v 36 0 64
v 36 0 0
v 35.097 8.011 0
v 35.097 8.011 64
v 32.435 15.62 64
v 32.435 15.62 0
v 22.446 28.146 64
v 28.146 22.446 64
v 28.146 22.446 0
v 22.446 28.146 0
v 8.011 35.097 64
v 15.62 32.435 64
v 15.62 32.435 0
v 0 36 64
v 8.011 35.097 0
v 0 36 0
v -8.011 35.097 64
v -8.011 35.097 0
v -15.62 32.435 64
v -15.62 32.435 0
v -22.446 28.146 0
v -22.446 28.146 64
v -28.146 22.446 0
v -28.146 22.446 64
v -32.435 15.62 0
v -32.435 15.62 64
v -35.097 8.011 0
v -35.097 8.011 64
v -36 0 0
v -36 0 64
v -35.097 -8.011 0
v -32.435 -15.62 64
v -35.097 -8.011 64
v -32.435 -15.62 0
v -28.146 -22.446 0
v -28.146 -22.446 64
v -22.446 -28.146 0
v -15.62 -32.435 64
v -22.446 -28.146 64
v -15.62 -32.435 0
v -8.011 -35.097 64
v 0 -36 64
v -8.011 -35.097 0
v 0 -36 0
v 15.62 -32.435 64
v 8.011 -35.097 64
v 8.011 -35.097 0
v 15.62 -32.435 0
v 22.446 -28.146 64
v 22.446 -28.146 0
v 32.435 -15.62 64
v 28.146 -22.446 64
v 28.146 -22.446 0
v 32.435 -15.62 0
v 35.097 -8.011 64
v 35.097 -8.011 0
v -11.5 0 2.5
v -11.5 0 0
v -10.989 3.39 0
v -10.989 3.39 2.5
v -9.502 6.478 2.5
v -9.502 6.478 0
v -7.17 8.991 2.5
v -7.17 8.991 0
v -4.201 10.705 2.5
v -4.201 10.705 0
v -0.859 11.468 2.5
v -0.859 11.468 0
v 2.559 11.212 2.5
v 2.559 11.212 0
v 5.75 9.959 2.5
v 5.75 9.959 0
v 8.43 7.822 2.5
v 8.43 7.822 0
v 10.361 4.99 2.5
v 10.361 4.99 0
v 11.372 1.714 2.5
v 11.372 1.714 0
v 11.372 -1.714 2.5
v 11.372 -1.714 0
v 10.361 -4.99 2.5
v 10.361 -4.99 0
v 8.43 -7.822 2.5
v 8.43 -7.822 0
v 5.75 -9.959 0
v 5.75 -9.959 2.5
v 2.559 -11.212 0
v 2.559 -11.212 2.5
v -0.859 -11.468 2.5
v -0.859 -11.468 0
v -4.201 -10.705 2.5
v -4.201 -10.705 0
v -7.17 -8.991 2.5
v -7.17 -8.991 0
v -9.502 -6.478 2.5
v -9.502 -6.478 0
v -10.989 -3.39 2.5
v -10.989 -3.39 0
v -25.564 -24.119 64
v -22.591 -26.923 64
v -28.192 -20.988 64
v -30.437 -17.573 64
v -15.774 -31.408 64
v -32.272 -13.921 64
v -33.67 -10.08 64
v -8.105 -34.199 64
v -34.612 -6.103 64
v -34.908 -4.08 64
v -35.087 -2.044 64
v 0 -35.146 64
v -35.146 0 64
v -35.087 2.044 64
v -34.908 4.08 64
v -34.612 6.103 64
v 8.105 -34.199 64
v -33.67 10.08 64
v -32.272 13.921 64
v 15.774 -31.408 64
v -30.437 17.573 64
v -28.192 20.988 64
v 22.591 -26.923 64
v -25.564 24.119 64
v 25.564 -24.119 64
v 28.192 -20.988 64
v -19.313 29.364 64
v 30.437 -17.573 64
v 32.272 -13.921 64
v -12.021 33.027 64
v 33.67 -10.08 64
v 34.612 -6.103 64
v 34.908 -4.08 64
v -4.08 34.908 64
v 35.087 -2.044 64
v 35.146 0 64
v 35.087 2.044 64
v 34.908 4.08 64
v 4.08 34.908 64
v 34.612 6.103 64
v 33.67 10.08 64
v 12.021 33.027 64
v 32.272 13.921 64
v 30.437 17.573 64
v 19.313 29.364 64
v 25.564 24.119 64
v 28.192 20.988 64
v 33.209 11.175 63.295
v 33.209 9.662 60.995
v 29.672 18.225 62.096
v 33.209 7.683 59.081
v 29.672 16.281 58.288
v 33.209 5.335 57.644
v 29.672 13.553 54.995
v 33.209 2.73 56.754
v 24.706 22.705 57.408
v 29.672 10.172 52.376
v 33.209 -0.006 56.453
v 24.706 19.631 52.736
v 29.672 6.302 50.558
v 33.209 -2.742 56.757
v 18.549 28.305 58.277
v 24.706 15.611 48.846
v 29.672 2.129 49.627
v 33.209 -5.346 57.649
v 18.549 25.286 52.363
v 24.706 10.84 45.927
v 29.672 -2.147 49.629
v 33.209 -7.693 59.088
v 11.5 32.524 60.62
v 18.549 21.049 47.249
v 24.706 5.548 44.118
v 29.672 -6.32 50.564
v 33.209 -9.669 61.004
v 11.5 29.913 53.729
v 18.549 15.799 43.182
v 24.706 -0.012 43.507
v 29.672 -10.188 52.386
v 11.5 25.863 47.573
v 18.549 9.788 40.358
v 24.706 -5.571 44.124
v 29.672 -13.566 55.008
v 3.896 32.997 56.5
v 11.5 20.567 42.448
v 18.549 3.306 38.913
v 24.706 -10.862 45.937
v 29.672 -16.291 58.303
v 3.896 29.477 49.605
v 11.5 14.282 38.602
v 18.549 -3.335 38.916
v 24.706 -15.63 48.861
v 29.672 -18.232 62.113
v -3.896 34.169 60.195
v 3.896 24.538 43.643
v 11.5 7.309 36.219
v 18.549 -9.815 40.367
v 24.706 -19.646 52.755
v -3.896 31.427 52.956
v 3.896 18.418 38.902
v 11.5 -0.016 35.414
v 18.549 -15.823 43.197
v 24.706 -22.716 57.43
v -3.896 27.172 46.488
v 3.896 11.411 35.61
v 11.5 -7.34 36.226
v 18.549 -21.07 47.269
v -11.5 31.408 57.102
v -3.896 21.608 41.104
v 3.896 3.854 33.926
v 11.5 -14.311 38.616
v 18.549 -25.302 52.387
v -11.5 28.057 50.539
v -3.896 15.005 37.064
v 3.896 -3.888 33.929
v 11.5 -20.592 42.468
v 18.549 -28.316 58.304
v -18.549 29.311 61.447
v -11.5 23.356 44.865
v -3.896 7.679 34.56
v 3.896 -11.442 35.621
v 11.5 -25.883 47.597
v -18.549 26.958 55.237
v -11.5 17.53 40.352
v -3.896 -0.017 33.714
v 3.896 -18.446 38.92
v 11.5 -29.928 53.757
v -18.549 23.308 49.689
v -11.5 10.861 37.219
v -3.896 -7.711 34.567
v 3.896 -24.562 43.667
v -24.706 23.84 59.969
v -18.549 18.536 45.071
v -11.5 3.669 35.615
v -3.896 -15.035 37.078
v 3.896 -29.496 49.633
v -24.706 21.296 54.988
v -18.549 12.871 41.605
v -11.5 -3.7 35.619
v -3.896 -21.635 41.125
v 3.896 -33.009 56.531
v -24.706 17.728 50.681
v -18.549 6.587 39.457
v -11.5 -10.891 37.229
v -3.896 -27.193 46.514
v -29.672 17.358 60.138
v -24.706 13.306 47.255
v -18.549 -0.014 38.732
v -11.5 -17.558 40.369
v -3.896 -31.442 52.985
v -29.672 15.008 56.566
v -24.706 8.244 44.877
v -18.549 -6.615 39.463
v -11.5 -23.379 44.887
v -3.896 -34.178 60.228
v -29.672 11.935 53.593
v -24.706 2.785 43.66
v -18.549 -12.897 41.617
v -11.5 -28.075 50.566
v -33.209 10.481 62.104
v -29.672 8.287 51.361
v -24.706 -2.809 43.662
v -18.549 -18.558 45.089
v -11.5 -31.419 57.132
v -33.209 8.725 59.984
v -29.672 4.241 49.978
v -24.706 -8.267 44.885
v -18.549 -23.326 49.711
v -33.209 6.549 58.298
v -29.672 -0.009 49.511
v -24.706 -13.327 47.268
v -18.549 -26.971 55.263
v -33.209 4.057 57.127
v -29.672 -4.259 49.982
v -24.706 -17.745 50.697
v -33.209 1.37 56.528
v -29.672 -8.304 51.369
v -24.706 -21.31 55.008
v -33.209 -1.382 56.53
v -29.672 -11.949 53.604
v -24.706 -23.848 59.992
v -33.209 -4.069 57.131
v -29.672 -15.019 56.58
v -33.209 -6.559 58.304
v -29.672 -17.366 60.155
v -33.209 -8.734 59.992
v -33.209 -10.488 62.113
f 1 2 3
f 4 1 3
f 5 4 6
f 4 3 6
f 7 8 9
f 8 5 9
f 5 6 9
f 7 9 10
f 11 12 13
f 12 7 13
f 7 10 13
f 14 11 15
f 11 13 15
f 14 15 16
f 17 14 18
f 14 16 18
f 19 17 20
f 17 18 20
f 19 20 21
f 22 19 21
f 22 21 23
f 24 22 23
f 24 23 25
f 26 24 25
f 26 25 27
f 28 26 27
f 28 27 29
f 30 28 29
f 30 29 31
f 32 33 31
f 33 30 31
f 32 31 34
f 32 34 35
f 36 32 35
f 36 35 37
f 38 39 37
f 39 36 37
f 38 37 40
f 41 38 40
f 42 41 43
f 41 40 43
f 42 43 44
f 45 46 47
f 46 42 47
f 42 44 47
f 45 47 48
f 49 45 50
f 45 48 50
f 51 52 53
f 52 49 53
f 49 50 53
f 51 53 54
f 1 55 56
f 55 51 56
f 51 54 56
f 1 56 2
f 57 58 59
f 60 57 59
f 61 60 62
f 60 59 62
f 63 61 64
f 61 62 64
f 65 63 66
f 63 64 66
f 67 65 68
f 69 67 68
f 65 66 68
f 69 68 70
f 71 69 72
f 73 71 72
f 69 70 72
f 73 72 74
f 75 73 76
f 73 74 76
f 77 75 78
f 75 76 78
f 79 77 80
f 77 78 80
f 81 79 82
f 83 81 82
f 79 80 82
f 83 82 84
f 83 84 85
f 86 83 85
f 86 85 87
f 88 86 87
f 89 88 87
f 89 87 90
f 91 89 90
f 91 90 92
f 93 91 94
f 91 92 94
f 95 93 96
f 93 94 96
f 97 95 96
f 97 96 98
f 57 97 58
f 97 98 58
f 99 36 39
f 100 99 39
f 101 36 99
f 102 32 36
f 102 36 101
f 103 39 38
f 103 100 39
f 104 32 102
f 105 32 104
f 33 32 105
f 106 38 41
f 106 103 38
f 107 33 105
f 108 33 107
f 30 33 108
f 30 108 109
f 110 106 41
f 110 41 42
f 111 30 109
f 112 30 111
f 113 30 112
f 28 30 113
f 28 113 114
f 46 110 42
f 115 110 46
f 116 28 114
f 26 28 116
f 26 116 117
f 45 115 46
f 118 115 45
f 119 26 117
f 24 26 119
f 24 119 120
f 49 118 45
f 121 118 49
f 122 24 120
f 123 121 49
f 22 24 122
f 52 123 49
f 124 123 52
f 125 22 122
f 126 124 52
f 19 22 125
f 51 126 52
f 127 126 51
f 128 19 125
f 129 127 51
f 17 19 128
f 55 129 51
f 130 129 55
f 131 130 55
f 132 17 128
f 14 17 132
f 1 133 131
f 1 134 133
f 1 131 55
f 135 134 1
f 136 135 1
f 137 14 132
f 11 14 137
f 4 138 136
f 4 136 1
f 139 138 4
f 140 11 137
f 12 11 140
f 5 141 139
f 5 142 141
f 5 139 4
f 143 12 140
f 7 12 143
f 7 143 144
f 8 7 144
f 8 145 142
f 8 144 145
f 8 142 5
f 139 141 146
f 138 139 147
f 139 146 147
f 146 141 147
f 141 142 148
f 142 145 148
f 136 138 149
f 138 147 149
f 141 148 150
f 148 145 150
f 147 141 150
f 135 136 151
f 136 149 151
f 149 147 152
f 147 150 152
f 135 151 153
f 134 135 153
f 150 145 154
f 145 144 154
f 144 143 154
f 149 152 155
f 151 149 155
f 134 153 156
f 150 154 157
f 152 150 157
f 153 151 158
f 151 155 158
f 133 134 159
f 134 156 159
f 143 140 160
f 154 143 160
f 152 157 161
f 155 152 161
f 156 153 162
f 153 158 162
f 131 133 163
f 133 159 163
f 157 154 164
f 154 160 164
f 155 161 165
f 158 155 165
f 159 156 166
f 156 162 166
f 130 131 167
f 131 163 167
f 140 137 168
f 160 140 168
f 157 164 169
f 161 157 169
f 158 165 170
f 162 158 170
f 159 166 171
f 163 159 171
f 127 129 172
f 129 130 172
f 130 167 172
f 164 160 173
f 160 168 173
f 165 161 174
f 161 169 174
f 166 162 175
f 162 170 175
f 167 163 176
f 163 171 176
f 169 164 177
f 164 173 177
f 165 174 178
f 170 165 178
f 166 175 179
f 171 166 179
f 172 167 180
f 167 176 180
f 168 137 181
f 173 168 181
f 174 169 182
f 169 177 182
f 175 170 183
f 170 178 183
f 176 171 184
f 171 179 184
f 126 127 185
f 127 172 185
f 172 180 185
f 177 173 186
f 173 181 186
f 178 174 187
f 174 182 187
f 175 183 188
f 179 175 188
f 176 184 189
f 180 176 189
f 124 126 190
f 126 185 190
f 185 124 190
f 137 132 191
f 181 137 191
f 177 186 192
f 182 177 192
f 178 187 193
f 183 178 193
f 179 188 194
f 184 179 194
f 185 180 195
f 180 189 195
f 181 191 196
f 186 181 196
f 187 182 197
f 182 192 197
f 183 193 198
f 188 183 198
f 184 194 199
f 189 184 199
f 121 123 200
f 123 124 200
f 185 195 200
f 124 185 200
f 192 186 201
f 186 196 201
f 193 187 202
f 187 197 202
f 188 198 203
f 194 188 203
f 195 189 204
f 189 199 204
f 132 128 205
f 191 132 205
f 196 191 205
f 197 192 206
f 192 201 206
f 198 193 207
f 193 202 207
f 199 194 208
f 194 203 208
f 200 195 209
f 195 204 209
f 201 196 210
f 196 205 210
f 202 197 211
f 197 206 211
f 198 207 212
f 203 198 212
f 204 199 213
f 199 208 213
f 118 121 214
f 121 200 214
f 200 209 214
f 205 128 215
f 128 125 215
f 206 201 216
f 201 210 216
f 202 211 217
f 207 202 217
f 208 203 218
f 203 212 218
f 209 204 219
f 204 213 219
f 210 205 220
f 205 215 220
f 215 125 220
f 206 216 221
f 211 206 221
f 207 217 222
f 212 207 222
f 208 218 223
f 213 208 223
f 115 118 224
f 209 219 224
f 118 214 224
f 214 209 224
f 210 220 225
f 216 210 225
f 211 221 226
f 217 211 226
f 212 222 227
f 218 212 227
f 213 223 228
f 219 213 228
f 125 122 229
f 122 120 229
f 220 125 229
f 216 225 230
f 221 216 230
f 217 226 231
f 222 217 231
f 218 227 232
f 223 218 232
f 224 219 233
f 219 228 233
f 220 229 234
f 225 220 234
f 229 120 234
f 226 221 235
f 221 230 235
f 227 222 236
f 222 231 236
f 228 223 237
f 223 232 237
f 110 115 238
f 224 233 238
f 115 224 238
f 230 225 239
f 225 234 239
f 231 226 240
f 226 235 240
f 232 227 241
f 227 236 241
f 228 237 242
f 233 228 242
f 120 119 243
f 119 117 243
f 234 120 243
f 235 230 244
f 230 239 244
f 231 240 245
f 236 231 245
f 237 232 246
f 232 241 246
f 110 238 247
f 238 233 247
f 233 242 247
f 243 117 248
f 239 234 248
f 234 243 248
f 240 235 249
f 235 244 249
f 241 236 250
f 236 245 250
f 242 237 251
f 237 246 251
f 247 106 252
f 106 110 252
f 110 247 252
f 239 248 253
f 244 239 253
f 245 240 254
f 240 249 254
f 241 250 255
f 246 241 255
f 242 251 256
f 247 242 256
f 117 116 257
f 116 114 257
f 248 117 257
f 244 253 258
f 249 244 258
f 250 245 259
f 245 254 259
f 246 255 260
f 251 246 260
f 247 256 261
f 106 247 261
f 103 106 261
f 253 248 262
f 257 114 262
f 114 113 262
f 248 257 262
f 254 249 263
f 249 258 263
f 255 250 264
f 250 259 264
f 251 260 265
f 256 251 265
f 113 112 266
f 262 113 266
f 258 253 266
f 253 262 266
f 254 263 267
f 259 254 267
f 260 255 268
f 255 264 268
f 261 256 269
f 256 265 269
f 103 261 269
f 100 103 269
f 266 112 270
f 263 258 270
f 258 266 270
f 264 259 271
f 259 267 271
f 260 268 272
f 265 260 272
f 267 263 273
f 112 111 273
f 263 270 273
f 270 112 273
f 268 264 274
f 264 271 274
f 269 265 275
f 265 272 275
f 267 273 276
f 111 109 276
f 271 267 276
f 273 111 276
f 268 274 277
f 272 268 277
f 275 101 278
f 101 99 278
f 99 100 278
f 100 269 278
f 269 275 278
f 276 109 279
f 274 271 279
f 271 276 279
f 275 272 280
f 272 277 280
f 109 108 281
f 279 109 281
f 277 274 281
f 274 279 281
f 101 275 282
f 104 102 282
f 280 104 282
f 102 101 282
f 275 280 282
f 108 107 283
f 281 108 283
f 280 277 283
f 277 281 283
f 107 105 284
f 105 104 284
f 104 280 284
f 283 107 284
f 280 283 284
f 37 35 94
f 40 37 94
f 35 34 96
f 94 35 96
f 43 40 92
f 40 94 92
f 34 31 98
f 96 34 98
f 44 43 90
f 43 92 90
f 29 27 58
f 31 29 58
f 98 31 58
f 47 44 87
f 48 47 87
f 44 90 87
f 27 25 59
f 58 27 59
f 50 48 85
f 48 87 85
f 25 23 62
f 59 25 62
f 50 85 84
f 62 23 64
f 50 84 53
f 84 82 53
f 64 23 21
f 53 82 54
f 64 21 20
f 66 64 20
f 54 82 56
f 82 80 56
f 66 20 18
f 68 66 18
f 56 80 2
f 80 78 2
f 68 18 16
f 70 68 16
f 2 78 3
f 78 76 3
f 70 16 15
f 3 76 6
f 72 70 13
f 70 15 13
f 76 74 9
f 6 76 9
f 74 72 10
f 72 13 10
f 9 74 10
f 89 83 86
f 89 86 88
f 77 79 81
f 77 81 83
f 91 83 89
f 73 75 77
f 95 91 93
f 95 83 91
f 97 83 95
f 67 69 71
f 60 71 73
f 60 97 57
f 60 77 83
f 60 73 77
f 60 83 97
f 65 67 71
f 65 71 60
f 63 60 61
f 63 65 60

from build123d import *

# Parameters (mm, degrees)
SKETCH2_R           = 36
BOSS_EXTRUDE1_DEPTH = 74
CUT_REVOLVE1_ANGLE  = 180
CUT_EXTRUDE1_REACH  = 12
SKETCH5_W           = 97.630906447
SKETCH5_H           = 85.301230118
SKETCH6_R           = 11.5
CUT_EXTRUDE2_DEPTH  = 2.5


with BuildPart() as part:
    # Sketch2 → Boss-Extrude1 (new body)
    with BuildSketch(Plane.XY):
        Circle(SKETCH2_R)
    extrude(amount=BOSS_EXTRUDE1_DEPTH)

    # Sketch4 → Cut-Revolve1 (revolve, cut)
    with BuildSketch(Plane.XY.offset(69)):
        with BuildLine():
            Line((-35.5, 0), (35.5, 0))
            ThreePointArc((35.5, 0), (0, 35.5), (-35.5, 0))
        make_face()
    revolve(axis=Axis((-35.5, 0, 69), (-1, 0, 0)), revolution_arc=CUT_REVOLVE1_ANGLE, mode=Mode.SUBTRACT)

    # Sketch5 → Cut-Extrude1 (cut, up to next)
    with BuildSketch(Plane.XY.offset(64), mode=Mode.PRIVATE) as cut_extrude1_sk1:
        with Locations((-1.59772985, 0.365427289)):
            Rectangle(SKETCH5_W, SKETCH5_H)
    cut_extrude1_tool1 = extrude(cut_extrude1_sk1.sketch, amount=CUT_EXTRUDE1_REACH, mode=Mode.PRIVATE) & part.part
    add(cut_extrude1_tool1.solids().sort_by_distance((-1.59773, 0.365427, 64))[0], mode=Mode.SUBTRACT)

    # Sketch6 → Cut-Extrude2 (cut)
    with BuildSketch(Plane(origin=(0, 0, 0), x_dir=(-1, 0, 0), z_dir=(0, 0, -1))):
        Circle(SKETCH6_R)
    extrude(amount=-CUT_EXTRUDE2_DEPTH, mode=Mode.SUBTRACT)


solid = part.part
